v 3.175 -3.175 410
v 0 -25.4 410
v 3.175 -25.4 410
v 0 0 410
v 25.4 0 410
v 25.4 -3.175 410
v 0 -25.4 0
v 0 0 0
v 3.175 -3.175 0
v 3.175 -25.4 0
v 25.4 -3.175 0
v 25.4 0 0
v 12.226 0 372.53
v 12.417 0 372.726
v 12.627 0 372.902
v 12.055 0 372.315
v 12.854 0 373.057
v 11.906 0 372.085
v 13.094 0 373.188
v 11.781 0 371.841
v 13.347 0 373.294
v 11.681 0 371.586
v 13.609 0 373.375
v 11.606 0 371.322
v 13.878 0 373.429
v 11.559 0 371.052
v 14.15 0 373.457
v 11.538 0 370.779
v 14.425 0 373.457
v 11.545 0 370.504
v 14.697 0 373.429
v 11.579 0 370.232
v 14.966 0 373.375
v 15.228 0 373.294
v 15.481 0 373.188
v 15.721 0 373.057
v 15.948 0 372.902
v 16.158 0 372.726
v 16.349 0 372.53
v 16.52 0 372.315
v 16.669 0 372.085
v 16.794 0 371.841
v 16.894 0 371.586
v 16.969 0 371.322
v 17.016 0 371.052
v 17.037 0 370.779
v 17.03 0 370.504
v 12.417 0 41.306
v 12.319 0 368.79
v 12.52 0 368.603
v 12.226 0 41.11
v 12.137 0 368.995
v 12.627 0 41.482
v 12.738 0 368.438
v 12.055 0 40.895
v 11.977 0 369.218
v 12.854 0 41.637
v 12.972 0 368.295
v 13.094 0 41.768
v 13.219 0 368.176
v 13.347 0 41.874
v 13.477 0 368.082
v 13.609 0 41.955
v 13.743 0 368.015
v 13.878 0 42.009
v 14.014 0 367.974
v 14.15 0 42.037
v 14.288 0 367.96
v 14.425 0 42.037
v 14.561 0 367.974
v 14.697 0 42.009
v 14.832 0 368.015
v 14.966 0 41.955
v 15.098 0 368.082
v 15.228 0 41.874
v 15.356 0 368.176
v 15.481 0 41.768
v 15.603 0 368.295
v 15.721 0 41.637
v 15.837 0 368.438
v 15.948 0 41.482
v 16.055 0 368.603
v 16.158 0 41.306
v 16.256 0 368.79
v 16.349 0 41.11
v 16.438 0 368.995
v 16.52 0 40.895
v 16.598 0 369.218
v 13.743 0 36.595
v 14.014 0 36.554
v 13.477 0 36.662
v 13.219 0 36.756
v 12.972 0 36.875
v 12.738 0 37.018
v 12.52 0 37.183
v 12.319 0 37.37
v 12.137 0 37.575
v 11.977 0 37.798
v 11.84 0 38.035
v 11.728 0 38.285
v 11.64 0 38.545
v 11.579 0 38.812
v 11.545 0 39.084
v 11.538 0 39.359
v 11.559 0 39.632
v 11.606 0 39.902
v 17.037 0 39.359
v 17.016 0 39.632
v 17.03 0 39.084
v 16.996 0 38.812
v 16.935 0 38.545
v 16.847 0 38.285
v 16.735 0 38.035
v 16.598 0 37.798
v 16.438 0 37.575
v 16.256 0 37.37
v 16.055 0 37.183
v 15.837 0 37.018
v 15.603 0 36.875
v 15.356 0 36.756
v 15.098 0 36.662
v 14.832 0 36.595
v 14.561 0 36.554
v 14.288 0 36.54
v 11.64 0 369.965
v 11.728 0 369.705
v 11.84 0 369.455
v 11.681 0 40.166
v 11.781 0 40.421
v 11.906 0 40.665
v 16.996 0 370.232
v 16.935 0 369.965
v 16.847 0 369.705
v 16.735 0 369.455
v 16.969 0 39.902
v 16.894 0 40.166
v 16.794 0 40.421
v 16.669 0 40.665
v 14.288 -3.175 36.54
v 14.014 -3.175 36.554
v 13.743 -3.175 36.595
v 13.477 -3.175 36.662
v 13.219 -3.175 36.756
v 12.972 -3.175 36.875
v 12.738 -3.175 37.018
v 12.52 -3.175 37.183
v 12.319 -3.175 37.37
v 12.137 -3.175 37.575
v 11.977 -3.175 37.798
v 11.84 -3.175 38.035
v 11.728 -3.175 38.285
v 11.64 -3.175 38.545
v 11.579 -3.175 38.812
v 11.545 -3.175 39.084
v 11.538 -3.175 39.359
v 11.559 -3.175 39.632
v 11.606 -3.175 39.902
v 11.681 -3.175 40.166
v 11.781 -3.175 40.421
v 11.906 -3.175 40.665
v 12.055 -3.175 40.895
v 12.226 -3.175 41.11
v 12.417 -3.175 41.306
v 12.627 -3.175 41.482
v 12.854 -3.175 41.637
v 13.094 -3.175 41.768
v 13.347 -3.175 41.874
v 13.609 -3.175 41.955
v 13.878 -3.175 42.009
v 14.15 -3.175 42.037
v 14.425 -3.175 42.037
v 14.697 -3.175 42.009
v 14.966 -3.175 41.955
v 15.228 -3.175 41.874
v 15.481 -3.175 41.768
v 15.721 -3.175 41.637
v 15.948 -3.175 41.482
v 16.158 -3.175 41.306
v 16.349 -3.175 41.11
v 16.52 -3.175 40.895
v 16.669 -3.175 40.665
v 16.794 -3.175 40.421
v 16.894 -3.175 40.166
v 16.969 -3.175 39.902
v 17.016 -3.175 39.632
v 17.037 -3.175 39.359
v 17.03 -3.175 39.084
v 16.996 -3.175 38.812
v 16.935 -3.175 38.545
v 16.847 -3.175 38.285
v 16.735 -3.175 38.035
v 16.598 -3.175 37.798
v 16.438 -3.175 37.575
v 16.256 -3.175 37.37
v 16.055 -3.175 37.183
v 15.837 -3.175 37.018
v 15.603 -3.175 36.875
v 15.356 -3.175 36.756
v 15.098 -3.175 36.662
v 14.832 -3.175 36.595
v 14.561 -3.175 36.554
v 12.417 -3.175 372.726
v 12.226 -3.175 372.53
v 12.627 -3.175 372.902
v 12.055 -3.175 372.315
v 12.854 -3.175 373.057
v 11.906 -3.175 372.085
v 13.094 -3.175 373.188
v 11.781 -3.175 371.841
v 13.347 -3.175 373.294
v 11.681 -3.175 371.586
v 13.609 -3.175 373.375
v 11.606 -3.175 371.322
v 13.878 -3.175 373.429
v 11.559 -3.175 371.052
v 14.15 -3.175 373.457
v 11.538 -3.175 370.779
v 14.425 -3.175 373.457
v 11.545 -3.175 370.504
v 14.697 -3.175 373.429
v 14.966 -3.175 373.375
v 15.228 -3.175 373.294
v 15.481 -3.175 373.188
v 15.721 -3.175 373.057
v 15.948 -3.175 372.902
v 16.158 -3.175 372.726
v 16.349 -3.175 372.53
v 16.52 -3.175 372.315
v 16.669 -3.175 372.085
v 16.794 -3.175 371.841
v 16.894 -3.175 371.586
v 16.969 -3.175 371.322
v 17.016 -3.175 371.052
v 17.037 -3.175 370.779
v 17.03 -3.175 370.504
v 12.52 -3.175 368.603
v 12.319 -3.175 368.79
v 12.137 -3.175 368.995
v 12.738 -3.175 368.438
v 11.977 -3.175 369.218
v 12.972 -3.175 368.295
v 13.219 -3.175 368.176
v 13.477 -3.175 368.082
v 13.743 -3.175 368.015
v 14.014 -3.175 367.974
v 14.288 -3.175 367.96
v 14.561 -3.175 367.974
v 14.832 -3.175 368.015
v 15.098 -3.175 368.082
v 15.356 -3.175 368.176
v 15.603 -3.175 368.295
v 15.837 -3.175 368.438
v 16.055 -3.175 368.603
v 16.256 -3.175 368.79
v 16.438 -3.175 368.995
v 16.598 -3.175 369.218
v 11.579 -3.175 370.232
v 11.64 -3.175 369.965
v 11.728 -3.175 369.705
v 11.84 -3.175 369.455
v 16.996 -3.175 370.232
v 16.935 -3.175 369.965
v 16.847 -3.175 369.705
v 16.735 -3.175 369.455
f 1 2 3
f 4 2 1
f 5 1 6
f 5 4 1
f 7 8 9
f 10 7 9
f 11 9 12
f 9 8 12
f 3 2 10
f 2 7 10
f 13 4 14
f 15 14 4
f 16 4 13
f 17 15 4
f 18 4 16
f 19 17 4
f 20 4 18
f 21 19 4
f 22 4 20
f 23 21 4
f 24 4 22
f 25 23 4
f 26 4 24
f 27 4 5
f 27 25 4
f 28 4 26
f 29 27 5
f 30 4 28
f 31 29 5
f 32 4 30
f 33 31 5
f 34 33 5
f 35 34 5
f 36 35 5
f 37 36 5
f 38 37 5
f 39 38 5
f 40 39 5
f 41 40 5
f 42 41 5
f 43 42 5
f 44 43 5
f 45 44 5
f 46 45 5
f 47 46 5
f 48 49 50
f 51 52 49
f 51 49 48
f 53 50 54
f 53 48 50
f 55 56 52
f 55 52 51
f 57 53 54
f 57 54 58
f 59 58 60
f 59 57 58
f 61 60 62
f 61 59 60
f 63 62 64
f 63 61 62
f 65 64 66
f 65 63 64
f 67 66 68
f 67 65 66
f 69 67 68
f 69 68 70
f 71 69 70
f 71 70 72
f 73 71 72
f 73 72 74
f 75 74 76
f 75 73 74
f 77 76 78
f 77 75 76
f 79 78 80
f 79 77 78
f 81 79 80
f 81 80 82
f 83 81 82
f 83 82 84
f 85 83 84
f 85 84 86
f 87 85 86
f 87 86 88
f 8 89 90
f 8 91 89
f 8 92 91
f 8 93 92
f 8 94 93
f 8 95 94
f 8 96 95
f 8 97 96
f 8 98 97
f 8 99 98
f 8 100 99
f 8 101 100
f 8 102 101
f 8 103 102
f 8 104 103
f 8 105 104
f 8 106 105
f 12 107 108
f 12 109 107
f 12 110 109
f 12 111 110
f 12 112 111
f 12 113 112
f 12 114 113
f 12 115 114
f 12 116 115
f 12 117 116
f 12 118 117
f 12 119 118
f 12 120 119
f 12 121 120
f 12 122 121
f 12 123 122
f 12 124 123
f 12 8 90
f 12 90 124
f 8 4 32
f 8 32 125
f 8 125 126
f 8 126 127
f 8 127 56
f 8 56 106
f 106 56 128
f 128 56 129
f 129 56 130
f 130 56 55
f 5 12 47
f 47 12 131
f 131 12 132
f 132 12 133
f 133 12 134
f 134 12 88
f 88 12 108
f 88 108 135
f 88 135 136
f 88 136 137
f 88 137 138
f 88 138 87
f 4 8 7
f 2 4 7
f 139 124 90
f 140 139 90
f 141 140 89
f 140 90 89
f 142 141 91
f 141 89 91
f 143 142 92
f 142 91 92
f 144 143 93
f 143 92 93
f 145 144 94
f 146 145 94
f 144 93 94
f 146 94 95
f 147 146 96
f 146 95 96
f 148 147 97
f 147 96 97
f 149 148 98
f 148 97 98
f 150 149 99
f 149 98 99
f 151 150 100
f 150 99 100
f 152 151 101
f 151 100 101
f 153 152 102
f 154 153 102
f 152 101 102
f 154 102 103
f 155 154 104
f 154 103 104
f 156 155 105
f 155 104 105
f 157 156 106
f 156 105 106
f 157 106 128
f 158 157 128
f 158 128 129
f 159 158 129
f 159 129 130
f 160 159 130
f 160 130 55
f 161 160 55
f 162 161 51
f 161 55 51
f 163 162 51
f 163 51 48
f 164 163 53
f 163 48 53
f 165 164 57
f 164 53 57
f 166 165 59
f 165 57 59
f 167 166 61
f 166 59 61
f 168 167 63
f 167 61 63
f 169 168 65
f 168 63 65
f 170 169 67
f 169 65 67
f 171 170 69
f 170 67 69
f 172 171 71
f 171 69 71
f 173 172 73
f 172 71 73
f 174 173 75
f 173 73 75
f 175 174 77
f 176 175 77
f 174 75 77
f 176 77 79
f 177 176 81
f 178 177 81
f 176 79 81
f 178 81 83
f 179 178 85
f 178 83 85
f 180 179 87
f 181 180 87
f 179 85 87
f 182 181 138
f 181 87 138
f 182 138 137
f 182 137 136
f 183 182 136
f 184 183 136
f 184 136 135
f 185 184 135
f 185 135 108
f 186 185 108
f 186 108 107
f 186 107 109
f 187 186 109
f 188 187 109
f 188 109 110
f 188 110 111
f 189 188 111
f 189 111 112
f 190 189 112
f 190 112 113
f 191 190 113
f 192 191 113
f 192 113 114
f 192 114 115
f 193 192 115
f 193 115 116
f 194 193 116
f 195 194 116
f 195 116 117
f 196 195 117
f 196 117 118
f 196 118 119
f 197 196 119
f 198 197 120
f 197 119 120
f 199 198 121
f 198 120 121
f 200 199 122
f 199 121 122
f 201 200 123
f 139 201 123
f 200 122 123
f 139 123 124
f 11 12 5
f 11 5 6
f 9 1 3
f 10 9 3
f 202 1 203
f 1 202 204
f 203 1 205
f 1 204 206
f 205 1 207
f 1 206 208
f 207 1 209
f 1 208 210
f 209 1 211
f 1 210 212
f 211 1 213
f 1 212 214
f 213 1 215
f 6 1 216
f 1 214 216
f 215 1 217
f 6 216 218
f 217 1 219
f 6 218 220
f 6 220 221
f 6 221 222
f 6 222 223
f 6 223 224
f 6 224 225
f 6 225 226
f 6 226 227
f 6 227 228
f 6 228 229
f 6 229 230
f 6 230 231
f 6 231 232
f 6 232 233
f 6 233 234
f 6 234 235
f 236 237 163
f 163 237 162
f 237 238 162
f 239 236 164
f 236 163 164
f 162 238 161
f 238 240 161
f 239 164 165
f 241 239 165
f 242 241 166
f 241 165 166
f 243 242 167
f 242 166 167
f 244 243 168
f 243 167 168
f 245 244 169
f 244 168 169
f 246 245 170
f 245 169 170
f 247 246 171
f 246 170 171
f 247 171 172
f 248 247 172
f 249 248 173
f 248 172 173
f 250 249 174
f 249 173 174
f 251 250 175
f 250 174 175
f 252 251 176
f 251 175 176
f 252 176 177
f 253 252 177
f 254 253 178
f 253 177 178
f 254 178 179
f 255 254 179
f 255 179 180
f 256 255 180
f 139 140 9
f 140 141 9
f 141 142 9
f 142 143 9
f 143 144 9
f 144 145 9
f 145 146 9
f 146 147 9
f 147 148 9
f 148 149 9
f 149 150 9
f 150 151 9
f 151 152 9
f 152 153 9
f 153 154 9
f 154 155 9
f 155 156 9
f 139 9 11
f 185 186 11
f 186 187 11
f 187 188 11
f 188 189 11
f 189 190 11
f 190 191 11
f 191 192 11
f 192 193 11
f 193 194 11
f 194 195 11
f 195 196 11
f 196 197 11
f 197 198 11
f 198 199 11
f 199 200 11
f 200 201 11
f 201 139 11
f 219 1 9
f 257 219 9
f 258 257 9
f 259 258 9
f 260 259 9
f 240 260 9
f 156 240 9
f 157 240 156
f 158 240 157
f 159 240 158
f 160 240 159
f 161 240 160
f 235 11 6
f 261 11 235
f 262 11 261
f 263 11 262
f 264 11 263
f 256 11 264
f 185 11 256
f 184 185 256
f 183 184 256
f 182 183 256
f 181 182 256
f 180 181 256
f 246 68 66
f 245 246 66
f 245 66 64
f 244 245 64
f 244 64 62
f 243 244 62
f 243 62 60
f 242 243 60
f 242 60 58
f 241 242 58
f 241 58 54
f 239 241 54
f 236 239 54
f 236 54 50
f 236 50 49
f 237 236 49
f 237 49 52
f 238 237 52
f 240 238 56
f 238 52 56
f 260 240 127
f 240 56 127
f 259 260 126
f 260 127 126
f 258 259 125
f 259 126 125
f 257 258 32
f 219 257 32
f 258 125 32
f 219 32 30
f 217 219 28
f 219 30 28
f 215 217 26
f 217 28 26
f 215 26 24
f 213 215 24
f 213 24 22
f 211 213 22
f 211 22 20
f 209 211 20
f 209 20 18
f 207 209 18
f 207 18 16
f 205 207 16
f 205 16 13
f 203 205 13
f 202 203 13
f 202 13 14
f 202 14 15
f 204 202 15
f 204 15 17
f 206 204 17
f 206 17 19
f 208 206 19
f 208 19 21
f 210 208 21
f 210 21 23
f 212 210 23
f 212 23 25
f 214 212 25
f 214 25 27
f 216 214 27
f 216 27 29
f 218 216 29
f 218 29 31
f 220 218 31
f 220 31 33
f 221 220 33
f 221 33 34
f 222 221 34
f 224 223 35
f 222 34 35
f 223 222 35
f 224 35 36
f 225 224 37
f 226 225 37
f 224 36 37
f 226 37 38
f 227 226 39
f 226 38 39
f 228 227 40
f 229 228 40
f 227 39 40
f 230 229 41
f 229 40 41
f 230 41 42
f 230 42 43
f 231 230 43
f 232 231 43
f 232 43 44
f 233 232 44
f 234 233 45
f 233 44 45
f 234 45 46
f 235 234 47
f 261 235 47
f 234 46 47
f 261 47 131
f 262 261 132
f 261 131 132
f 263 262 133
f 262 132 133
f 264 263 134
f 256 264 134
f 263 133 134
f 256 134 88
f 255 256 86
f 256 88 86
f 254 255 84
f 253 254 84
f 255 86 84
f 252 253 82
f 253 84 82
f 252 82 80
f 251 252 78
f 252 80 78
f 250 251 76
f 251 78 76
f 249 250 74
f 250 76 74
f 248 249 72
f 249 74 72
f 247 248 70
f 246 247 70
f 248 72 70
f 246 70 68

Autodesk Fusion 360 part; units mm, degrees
sketch "Sketch1" plane through (0, 0, 0) normal (0, 0, 1) x (1, 0, 0)
  line L0 (0, 0) -> (25.4, 0)
  line L1 (0, 0) -> (0, -25.4)
  line L2 (3.175, -3.175) -> (25.4, -3.175)
  line L3 (3.175, -3.175) -> (3.175, -25.4)
  line L4 (25.4, 0) -> (25.4, -3.175)
  line L5 (0, -25.4) -> (3.175, -25.4)
  dimension "d1" = 25.4
  dimension "d2" = -3.175
extrude "Extrude1" add sketch "Sketch1" along normal blind 410
sketch "Sketch2" plane through (0, -3.175, 0) normal (0, -1, 0) x (1, 0, 0)
  line L0 (3.175, 0) -> (25.4, 0)
  line L1 (25.4, 0) -> (25.4, 410)
  line L2 (25.4, 410) -> (3.175, 410)
  line L3 (3.175, 410) -> (3.175, 0)
  circle A0 centre (14.2875, 370.71) radius 4.4166
  circle A1 centre (14.2875, 39.29) radius 4.4166
  line L4 (14.2875, 410) -> (14.2875, 0) construction
  line L5 (14.2875, 205) -> (25.4, 205) construction
  dimension "d6" = 165.71
  dimension "d7" = 165.71
hole "Hole1" at (14.2875, -3.175, 370.71) at (14.2875, -3.175, 39.29) direction (0, 1, 0) diameter 5.5 depth 7 tip angle 118
